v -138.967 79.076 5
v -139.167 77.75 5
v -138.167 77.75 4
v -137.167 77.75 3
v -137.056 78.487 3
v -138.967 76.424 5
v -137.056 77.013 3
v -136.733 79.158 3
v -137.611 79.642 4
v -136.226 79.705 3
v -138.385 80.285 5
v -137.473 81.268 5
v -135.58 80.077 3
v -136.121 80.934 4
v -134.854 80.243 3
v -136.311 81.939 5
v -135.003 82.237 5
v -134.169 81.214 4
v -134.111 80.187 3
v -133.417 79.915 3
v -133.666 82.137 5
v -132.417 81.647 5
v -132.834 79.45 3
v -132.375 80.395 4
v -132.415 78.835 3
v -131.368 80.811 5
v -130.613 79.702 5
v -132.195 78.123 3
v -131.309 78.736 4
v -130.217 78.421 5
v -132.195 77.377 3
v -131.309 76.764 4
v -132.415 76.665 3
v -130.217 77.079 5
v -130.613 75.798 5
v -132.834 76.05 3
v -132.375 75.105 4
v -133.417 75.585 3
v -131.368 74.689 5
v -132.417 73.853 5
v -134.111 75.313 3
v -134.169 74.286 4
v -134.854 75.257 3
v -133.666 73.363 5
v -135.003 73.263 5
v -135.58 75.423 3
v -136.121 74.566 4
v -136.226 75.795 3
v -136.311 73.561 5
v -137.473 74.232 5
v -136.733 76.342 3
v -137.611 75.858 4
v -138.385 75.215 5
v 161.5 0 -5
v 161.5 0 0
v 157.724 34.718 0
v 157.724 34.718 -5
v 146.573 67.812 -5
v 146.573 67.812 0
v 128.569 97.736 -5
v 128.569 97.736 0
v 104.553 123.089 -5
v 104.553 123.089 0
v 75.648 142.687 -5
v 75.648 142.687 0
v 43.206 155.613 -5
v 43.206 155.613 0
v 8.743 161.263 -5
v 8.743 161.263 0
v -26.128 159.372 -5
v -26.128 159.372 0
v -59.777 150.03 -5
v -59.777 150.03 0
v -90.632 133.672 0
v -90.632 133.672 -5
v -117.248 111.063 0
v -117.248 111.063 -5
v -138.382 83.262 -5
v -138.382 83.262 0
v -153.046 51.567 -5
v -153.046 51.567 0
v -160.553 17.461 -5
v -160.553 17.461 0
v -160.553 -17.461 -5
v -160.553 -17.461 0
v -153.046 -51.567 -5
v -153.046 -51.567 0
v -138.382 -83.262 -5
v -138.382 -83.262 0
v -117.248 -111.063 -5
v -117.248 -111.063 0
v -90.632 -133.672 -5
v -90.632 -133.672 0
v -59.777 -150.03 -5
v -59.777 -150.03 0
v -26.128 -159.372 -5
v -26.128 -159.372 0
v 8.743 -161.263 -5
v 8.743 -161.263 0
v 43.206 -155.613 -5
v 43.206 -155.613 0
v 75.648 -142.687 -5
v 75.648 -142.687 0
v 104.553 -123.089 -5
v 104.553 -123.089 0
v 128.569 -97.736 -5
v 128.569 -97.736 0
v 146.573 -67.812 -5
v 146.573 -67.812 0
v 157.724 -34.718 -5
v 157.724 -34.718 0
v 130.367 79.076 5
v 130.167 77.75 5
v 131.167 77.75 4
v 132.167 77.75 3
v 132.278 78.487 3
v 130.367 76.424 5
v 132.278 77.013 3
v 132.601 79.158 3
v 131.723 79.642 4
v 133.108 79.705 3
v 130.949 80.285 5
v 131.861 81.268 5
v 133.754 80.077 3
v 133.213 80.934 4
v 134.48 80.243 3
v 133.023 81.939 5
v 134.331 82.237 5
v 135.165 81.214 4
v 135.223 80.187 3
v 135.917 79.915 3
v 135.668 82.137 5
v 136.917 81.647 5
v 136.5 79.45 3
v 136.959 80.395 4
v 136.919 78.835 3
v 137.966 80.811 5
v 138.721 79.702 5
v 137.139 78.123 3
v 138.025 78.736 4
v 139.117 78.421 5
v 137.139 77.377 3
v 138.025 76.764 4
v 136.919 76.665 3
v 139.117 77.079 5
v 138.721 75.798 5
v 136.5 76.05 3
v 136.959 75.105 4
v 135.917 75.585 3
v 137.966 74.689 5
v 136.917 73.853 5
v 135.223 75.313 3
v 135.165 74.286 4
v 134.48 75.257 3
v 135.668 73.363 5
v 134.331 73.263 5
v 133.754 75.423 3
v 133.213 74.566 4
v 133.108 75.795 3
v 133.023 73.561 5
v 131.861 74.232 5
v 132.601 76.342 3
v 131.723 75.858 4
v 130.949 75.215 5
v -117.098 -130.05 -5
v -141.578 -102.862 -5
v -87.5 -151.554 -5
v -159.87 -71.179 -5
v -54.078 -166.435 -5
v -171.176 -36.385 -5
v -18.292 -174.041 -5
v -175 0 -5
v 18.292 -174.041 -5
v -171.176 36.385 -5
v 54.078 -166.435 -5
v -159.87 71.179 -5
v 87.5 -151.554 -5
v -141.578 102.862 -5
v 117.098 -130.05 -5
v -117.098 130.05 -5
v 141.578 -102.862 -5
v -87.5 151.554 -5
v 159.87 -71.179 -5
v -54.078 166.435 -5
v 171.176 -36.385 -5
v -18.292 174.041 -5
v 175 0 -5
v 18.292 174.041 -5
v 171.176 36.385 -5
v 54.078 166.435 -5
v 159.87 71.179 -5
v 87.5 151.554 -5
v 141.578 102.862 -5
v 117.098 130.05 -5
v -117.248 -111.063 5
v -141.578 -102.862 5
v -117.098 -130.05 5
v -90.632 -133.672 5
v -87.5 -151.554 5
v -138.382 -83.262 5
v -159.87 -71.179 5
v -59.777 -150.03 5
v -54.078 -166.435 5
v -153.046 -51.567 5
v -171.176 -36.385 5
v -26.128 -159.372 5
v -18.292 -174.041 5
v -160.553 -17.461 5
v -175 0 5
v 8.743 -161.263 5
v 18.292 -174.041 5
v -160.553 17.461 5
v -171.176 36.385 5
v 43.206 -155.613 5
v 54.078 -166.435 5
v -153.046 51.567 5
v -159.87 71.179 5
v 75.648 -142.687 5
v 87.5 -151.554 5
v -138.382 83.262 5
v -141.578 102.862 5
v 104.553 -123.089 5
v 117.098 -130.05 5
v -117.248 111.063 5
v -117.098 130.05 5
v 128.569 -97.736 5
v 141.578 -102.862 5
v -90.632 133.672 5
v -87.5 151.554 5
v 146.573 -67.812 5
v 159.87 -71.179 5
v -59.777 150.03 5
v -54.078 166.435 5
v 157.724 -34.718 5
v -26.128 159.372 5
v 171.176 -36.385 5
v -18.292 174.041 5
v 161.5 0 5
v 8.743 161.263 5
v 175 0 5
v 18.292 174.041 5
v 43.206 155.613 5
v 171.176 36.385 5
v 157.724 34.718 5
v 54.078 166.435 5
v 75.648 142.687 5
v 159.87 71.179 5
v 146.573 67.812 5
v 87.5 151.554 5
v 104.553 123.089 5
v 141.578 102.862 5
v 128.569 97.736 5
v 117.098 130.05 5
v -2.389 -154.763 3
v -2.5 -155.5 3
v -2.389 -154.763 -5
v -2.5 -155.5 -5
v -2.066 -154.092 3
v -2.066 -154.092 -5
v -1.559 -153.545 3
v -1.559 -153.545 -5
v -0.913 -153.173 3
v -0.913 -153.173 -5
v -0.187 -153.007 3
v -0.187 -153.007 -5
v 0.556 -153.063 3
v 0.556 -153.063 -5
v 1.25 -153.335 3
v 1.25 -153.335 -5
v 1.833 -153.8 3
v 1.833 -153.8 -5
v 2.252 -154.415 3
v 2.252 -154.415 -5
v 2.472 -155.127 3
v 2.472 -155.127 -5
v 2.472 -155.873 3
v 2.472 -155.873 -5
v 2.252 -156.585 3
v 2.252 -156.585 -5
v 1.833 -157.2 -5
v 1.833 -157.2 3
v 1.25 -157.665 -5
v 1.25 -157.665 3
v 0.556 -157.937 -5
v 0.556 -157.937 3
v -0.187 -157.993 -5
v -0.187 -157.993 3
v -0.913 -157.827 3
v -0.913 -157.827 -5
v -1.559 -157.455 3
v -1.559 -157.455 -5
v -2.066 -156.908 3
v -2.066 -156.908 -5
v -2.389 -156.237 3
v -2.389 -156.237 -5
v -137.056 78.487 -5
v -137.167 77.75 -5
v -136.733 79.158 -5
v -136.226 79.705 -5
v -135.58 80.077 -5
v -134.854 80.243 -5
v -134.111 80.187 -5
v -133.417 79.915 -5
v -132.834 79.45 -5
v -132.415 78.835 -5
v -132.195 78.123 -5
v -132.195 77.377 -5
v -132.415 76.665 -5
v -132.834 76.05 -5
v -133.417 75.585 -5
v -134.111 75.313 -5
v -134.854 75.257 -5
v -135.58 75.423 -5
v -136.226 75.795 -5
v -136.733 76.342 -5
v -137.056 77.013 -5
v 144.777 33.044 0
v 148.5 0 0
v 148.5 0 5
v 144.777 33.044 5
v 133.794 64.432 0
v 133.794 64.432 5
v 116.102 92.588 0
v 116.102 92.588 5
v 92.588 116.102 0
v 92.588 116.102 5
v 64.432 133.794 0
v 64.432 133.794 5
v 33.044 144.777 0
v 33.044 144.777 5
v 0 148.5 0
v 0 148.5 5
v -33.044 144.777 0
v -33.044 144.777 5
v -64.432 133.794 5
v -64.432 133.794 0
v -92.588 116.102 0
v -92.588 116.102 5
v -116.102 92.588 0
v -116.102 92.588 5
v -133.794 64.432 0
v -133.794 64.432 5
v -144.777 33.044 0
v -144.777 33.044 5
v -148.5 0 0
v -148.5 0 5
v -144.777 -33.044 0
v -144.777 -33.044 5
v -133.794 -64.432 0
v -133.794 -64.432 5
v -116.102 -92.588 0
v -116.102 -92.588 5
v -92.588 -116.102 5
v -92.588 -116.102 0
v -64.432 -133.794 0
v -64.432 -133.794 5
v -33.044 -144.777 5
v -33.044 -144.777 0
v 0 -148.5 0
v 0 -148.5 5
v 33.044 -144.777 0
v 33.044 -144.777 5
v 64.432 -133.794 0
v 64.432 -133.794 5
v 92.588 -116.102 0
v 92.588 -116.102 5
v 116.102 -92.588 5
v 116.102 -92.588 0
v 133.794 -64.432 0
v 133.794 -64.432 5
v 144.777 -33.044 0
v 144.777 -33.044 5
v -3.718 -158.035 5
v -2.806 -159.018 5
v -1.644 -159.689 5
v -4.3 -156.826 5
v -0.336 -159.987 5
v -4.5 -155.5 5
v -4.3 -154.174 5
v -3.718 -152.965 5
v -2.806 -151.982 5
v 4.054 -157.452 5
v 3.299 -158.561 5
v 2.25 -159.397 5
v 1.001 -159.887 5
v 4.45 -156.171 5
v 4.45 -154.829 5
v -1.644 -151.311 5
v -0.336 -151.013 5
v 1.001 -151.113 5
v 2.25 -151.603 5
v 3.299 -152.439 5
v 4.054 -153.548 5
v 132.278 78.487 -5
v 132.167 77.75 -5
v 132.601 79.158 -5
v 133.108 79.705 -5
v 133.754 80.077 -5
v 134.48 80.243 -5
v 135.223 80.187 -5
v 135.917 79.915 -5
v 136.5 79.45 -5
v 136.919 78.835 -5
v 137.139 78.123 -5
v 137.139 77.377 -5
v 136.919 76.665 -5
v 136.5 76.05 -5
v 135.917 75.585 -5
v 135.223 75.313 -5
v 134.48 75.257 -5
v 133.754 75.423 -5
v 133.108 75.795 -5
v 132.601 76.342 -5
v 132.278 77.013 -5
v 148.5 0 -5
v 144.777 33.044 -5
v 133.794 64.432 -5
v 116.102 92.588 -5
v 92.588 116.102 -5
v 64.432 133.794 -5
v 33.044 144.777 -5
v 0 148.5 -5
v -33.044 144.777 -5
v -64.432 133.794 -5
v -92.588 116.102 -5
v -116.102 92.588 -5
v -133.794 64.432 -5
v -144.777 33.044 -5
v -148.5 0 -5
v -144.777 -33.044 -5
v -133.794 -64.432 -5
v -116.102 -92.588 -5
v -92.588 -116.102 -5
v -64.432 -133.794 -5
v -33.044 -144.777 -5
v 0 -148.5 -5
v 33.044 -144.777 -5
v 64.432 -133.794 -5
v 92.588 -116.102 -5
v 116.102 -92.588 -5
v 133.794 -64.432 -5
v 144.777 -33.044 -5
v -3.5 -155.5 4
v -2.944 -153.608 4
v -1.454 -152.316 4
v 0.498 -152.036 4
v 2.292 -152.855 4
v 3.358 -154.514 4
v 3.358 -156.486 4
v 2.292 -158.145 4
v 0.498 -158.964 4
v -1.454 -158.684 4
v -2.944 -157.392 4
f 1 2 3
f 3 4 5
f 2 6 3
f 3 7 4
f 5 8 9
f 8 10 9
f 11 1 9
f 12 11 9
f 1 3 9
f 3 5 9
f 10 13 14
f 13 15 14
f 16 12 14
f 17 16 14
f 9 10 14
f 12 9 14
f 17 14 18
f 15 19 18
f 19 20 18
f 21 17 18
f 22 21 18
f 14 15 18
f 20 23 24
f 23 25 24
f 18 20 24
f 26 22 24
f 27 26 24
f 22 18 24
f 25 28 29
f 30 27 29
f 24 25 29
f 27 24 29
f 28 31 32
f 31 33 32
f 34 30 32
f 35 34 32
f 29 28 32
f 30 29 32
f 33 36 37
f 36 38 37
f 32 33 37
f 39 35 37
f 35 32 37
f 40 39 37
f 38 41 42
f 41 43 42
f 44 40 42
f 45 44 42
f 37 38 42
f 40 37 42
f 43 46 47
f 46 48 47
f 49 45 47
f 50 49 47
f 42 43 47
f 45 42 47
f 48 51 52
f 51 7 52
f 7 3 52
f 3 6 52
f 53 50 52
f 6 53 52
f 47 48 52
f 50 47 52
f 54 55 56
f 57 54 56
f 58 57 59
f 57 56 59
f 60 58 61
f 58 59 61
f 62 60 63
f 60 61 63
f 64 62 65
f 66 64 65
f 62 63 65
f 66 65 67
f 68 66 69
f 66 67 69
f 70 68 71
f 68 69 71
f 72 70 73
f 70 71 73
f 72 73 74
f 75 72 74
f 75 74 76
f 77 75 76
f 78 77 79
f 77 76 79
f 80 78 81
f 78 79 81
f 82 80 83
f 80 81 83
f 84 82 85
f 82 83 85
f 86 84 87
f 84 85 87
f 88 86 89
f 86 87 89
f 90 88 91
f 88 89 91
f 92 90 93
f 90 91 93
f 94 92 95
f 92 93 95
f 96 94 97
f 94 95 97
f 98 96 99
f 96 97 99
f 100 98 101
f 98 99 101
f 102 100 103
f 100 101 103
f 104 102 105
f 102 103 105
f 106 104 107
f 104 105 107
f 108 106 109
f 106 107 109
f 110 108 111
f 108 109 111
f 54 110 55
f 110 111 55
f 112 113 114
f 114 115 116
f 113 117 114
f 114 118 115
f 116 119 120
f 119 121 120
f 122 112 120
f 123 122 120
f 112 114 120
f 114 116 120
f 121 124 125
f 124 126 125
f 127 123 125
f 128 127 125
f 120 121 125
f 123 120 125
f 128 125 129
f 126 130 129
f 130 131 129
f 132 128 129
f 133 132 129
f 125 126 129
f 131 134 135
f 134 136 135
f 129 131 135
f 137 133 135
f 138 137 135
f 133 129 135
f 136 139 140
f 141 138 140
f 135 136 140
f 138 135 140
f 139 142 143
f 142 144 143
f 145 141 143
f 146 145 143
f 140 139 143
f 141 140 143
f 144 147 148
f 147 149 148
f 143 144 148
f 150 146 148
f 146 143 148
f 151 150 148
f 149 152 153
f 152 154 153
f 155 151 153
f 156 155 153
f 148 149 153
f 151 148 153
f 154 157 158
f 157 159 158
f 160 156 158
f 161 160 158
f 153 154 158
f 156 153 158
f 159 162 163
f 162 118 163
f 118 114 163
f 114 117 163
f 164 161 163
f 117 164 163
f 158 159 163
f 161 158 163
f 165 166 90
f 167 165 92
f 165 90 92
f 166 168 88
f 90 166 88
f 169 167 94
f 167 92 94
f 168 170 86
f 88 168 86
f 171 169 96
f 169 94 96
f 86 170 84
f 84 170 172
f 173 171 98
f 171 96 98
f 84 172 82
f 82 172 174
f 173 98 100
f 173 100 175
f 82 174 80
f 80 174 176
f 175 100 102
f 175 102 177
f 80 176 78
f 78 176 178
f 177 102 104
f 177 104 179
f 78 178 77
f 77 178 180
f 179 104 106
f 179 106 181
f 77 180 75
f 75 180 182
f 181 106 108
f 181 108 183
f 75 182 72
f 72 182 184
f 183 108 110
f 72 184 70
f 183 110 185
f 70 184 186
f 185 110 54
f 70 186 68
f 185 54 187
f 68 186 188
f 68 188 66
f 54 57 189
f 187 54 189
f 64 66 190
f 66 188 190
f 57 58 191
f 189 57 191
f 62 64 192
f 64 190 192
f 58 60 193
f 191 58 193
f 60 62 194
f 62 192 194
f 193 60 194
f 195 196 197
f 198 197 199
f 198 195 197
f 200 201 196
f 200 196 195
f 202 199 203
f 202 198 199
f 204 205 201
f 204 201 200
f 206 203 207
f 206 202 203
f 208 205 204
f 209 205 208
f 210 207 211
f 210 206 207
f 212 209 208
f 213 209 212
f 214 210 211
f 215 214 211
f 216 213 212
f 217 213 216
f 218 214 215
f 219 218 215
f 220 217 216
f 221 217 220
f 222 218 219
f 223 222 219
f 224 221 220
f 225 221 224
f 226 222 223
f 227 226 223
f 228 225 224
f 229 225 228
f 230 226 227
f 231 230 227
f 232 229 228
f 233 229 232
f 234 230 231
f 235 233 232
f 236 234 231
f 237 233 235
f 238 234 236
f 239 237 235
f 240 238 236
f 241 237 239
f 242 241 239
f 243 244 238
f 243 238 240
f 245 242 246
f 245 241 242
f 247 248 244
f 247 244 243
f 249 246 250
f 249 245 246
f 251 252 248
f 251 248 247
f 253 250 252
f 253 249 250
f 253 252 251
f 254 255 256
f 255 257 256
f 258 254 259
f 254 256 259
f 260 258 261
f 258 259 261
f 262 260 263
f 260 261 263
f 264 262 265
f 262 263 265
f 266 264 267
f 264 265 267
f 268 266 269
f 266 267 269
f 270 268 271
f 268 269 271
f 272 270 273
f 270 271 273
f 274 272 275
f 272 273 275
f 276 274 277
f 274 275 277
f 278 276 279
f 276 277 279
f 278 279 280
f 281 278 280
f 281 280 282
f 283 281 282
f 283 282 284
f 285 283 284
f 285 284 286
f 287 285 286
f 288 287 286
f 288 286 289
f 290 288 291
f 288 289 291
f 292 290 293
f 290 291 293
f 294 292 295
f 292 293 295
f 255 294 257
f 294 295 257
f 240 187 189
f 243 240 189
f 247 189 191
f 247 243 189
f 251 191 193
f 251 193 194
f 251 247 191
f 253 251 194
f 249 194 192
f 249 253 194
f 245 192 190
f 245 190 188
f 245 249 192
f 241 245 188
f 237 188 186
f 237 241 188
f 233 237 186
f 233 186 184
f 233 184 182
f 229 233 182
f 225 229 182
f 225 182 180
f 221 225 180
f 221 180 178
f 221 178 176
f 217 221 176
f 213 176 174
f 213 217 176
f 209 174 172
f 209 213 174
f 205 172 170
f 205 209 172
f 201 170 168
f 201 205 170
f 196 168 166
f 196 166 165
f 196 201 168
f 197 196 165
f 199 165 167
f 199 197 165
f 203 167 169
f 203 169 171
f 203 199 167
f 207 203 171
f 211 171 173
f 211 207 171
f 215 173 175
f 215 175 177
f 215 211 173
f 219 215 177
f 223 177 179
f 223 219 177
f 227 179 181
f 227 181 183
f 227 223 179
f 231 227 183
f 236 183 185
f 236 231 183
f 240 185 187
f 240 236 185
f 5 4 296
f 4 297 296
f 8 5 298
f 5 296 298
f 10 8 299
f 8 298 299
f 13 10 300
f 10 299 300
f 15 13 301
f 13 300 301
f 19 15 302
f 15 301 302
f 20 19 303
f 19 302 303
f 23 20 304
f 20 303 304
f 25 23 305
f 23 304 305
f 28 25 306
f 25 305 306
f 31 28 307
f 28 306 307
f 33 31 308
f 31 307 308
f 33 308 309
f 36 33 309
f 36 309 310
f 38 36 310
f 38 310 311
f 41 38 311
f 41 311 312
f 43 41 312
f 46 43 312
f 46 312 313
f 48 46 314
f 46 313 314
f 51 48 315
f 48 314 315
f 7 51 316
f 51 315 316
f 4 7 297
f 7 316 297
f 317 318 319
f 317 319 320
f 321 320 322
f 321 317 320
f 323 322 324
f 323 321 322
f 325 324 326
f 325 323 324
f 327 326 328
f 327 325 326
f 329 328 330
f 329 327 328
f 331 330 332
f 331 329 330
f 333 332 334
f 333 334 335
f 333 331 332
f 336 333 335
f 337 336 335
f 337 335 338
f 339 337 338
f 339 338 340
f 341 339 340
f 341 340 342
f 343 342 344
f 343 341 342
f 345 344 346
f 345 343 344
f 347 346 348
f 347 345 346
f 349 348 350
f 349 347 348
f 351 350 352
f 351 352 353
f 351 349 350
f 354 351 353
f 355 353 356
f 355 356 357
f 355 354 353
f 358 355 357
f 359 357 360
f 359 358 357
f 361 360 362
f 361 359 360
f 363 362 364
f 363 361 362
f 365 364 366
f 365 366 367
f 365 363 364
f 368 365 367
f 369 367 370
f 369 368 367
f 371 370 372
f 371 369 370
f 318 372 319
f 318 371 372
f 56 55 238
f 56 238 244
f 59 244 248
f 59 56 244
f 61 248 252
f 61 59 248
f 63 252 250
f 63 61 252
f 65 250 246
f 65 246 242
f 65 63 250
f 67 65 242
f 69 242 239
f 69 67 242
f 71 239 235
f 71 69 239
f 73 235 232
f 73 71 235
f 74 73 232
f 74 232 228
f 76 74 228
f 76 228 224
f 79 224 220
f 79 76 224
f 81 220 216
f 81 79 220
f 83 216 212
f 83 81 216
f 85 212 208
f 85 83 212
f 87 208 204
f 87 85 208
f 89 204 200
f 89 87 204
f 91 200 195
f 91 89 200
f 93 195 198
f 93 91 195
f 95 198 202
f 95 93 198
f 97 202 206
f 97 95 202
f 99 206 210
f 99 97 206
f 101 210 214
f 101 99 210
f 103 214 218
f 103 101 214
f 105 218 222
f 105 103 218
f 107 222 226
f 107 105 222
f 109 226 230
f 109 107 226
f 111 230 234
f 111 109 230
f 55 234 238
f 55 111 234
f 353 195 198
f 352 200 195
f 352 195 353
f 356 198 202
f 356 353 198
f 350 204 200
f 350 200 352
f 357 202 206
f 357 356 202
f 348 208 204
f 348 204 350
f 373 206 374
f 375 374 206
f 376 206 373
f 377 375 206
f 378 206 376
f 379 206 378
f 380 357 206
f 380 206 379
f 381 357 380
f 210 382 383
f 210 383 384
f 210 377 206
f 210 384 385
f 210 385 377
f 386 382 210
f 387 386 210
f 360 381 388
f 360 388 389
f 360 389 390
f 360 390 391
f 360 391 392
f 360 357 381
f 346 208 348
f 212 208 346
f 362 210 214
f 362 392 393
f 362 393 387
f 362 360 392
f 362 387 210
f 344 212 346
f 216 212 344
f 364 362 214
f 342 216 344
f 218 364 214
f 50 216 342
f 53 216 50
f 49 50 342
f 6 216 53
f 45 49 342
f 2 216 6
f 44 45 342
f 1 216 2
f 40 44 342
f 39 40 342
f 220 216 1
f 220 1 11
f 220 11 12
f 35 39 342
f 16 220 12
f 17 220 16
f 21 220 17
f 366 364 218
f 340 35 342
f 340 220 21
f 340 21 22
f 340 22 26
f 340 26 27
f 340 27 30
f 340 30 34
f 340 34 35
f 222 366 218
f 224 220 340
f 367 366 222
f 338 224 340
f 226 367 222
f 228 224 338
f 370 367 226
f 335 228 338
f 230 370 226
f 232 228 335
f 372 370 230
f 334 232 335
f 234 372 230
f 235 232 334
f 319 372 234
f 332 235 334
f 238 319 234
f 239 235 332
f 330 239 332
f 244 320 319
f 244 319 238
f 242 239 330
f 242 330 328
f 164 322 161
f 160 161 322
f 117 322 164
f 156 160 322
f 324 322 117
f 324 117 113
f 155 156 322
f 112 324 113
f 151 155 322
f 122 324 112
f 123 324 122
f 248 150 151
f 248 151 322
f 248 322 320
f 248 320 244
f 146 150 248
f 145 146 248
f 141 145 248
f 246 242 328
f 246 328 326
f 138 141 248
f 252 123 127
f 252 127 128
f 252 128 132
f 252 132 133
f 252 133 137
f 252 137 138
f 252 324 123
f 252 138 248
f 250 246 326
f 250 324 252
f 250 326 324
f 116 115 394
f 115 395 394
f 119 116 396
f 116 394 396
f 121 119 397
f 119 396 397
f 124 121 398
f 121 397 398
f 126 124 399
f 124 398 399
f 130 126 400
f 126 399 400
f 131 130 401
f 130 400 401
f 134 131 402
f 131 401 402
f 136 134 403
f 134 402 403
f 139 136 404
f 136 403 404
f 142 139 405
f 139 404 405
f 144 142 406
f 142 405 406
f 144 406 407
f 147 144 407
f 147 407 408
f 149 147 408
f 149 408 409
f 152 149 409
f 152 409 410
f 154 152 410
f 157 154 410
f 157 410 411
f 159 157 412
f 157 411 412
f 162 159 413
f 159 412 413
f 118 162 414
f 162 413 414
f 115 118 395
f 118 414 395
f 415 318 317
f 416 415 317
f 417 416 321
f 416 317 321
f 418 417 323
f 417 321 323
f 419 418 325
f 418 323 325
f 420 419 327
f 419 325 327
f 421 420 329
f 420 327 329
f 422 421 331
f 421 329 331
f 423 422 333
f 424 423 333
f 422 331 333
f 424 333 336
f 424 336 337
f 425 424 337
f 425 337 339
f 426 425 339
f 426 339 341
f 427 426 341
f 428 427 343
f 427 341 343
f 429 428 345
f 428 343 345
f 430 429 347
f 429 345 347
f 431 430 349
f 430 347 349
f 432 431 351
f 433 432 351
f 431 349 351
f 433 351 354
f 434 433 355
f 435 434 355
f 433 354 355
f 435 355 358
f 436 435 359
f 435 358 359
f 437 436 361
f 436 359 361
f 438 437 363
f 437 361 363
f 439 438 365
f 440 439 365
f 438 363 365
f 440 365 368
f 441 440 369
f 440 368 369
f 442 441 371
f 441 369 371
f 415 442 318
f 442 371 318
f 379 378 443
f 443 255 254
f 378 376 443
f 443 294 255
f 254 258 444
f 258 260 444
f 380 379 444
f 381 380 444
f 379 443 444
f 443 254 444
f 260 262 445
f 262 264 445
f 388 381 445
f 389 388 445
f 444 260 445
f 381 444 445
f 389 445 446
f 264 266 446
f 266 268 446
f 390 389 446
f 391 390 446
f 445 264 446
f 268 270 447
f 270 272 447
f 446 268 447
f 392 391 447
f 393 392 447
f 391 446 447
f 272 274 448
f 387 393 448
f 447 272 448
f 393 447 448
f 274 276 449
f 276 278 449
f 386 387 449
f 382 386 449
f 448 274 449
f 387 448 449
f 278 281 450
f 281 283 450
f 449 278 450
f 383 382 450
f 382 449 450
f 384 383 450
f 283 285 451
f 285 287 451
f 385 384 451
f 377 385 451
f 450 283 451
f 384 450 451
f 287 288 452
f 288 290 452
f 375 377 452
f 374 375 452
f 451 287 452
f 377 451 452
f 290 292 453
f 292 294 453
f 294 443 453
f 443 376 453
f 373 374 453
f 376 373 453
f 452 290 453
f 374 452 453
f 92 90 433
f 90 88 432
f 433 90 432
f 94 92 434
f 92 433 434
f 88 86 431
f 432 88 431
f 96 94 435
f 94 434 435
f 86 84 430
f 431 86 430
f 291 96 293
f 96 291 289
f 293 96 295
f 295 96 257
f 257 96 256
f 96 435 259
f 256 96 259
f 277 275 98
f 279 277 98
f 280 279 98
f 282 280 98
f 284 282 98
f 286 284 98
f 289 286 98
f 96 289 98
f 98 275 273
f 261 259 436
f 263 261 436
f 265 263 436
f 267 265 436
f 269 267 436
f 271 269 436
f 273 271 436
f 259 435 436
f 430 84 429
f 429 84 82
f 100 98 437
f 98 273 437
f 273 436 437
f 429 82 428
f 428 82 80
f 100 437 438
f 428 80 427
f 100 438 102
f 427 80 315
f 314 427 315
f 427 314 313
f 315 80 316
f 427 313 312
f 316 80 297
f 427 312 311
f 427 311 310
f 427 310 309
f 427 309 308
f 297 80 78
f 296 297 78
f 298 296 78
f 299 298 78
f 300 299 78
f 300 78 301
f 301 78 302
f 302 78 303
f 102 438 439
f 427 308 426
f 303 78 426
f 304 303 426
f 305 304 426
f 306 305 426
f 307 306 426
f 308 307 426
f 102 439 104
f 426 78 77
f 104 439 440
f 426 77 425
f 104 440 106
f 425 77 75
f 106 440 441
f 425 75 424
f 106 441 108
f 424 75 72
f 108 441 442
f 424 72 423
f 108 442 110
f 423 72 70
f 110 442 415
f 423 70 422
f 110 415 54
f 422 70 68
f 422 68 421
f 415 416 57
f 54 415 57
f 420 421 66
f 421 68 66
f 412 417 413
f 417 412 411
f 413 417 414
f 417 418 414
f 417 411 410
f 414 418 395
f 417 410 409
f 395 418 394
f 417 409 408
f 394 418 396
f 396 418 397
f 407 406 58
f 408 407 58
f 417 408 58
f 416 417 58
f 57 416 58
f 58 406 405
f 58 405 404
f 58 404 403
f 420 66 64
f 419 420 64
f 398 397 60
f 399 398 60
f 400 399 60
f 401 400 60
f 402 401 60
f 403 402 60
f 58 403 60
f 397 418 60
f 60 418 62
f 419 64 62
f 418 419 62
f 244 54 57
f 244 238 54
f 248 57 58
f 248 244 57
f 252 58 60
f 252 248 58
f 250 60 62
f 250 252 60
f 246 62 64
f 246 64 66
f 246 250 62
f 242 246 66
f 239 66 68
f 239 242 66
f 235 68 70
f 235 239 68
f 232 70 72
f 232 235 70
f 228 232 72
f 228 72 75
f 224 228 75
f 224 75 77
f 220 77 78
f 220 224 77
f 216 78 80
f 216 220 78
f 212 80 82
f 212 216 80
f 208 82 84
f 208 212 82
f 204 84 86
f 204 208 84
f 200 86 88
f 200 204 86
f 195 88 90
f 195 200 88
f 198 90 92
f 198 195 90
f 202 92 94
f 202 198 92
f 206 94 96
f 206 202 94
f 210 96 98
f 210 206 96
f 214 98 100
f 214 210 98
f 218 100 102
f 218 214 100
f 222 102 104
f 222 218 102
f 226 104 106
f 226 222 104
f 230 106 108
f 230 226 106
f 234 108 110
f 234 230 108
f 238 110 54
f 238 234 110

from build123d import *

# Parameters (mm, degrees)
F0_R           = 175
F0_R_2         = 161.5
F1_DEPTH       = 5
F1_DEPTH_BACK  = 5
F0_R_3         = 148.5
F2_DEPTH       = 5
F2_DEPTH_BACK  = 5
F4_D           = 5
F4_CSINK_D     = 9
F4_CSINK_ANGLE = 90


with BuildPart() as f1:
    # F0 (on Top) → F1 (new body, two sides)
    with BuildSketch(Plane.XY) as f1_sk:
        Circle(F0_R)
        Circle(F0_R_2, mode=Mode.SUBTRACT)
    extrude(amount=F1_DEPTH)
    extrude(f1_sk.sketch, amount=-F1_DEPTH_BACK)


with BuildPart() as f2:
    # F0 (on Top) → F2 (new body, two sides)
    with BuildSketch(Plane.XY) as f2_sk:
        Circle(F0_R_2)
        Circle(F0_R_3, mode=Mode.SUBTRACT)
    extrude(amount=F2_DEPTH)
    extrude(f2_sk.sketch, amount=-F2_DEPTH_BACK)

    # F4 (through all)
    with Locations(Plane.XY.offset(5)):
        with Locations((-134.66695, 77.75), (134.66695, 77.75), (0, -155.5)):
            CounterSinkHole(F4_D / 2, F4_CSINK_D / 2, counter_sink_angle=F4_CSINK_ANGLE)


solid = Compound([f1.part, f2.part])
